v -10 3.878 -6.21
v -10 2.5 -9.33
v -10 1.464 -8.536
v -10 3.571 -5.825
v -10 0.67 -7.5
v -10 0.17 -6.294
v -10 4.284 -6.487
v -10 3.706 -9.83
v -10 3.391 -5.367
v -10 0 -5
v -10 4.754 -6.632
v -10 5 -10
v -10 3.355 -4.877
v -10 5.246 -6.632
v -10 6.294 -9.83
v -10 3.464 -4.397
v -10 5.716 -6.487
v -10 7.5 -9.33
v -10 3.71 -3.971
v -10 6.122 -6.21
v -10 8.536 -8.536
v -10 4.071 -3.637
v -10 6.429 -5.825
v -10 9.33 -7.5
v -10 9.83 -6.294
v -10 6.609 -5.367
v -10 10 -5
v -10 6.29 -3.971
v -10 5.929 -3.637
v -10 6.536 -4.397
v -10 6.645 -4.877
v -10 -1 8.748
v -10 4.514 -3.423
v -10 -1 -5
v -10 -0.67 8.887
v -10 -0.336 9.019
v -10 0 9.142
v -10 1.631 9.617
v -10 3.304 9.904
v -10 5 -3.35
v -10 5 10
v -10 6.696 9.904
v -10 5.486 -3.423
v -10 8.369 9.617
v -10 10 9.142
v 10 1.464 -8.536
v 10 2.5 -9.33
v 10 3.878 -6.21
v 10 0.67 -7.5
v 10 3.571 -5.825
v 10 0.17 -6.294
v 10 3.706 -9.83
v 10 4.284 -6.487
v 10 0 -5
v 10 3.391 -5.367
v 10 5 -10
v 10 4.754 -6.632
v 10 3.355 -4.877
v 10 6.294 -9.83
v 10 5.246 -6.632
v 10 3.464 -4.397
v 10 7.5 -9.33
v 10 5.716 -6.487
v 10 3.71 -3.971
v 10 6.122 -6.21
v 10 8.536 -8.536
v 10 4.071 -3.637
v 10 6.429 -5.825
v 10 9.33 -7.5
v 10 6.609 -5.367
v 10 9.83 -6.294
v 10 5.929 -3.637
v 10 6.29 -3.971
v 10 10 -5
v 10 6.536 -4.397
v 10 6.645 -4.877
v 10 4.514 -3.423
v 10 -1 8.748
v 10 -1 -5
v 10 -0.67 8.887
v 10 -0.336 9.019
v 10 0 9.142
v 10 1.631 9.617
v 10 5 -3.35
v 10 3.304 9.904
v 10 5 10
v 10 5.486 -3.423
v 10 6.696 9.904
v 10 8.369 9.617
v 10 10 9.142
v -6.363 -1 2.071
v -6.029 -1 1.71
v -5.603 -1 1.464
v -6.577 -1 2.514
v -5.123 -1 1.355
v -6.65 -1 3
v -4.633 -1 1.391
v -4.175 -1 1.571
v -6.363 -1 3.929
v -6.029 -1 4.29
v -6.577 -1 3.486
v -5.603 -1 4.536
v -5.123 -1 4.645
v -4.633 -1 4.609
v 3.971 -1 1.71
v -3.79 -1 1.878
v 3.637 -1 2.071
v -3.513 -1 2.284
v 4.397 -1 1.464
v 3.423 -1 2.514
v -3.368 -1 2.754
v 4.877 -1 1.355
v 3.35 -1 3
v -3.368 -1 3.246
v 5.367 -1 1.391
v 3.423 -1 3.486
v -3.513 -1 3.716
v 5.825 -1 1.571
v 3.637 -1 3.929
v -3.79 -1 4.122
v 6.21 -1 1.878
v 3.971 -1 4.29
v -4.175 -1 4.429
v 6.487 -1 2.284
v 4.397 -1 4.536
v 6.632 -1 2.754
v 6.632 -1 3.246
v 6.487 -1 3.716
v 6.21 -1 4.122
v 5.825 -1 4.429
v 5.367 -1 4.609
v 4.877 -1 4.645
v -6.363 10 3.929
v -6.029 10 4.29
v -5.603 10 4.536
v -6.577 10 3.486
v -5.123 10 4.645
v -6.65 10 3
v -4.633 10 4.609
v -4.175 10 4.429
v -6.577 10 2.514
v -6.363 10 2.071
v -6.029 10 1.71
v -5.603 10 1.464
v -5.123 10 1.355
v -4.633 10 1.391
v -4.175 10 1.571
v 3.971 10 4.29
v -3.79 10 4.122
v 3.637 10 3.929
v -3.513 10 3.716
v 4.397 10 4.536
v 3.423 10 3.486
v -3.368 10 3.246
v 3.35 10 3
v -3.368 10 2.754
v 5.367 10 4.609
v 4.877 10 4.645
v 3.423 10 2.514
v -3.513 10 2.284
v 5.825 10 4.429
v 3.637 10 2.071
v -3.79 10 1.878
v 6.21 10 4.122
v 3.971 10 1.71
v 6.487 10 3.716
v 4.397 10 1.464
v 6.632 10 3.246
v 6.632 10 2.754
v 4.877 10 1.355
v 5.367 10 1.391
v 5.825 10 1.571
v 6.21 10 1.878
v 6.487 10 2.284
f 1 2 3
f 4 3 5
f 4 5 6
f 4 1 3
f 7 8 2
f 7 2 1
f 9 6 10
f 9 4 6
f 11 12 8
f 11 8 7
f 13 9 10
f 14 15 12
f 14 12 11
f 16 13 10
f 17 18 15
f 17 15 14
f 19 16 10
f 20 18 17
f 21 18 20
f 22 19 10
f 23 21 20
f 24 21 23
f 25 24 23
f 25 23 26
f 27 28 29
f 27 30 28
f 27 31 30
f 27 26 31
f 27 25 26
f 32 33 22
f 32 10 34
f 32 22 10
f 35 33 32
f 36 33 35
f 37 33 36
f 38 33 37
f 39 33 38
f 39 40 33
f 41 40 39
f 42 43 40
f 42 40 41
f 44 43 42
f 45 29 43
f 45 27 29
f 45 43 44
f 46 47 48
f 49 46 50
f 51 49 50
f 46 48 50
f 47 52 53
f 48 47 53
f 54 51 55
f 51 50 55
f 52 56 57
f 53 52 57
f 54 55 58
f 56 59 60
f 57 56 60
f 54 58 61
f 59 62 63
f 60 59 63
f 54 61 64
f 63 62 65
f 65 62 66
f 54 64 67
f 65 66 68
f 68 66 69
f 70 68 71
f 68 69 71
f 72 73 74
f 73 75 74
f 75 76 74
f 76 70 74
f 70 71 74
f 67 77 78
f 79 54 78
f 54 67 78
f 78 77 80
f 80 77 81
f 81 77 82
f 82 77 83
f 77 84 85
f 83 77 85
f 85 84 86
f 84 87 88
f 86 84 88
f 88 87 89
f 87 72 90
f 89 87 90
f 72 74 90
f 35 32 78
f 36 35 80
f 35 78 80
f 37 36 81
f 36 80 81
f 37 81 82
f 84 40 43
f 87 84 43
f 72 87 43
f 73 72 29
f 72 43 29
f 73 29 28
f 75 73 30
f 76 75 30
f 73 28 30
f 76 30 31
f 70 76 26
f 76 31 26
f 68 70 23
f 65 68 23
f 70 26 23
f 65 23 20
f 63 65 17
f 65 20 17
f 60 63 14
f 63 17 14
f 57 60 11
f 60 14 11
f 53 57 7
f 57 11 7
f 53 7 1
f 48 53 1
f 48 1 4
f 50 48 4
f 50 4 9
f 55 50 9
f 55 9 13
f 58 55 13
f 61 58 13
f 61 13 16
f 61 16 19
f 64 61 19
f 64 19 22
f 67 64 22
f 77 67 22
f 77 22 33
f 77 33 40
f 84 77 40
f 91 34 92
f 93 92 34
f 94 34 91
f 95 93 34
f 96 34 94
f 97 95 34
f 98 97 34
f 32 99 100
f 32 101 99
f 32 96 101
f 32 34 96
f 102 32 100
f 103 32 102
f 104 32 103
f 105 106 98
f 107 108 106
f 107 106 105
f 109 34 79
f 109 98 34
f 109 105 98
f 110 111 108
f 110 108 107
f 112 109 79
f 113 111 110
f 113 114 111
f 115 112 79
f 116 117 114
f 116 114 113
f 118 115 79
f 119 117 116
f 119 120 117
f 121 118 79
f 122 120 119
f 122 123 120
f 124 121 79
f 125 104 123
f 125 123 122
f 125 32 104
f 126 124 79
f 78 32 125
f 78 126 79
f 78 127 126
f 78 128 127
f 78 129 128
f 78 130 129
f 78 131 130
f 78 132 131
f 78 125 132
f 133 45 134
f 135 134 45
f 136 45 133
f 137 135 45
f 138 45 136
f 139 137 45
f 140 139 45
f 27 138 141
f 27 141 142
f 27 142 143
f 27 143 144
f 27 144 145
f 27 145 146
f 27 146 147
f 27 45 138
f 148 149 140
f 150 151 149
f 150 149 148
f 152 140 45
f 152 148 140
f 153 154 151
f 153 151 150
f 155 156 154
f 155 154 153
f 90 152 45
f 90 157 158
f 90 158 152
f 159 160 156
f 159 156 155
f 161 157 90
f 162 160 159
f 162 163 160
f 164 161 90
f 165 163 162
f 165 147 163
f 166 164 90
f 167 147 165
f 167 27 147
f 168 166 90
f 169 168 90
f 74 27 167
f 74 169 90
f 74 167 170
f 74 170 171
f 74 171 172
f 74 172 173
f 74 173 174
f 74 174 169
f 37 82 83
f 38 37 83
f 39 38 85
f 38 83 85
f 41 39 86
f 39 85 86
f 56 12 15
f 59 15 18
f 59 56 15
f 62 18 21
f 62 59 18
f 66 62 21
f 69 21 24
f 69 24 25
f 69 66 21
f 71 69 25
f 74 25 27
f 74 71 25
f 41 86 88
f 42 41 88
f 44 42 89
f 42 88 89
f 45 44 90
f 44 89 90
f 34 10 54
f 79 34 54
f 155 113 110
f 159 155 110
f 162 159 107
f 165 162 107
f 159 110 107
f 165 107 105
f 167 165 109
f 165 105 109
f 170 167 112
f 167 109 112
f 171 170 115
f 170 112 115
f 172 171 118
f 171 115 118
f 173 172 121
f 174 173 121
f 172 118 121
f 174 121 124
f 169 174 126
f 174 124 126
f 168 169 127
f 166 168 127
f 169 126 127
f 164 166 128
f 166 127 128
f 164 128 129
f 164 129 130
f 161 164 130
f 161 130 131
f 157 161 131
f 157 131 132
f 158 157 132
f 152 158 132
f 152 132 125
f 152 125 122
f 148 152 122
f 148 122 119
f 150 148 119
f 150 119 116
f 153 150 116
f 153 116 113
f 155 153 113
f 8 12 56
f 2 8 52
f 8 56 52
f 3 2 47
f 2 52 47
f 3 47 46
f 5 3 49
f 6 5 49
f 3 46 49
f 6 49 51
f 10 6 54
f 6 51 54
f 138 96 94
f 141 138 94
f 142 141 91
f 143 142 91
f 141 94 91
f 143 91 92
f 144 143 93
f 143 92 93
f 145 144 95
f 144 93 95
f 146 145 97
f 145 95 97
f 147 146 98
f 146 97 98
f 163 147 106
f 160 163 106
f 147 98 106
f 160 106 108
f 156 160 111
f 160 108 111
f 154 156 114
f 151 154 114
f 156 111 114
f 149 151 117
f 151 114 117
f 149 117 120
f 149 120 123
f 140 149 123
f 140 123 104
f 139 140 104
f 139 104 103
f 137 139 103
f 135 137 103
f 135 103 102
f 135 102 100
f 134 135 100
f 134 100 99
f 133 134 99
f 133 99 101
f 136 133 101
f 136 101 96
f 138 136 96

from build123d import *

# Parameters (mm, degrees)
SKETCH1_W             = 20
SKETCH1_H             = 20
BOSS_EXTRUDE1_DEPTH   = 10
FILLET1_R             = 5
M4X0_7_TAPPED_HOLE1_D = 3.3
SKETCH14_W            = 20
SKETCH14_H            = 15
BOSS_EXTRUDE4_DEPTH   = 1
M4X0_7_TAPPED_HOLE2_D = 3.3
CUT_EXTRUDE1_DEPTH    = 25.494897428


with BuildPart() as part:
    # Sketch1 → Boss-Extrude1 (new body)
    with BuildSketch(Plane(origin=(0, 0, 0), x_dir=(1, 0, 0), z_dir=(0, 1, 0))):
        Rectangle(SKETCH1_W, SKETCH1_H)
    extrude(amount=BOSS_EXTRUDE1_DEPTH)

    # Fillet1
    fillet1_edges = [part.edges().sort_by_distance(p)[0] for p in [
        (0, 0, -10),
        (0, 10, -10),
    ]]
    fillet(fillet1_edges, radius=FILLET1_R - 0.0001)  # a hair under: the kernel refuses the full size

    # M4x0.7 Tapped Hole1 (through all)
    with Locations(Plane(origin=(10, 0, 0), x_dir=(0, 0, -1), z_dir=(1, 0, 0))):
        with Locations((5, 5)):
            Hole(M4X0_7_TAPPED_HOLE1_D / 2)

    # Sketch14 → Boss-Extrude4 (add)
    with BuildSketch(Plane.XZ):
        with Locations((0, 2.5)):
            Rectangle(SKETCH14_W, SKETCH14_H)
    extrude(amount=BOSS_EXTRUDE4_DEPTH)

    # M4x0.7 Tapped Hole2 (through all)
    with Locations(Plane(origin=(0, 10, 0), x_dir=(1, 0, 0), z_dir=(0, 1, 0))):
        with Locations((-5, -3), (5, -3)):
            Hole(M4X0_7_TAPPED_HOLE2_D / 2)

    # Sketch9 → Cut-Extrude1 (cut, through all)
    with BuildSketch(Plane(origin=(10, 0, 0), x_dir=(0, 0, -1), z_dir=(1, 0, 0))):
        with BuildLine():
            ThreePointArc((-10, 5), (-9.783978395, 7.536529681), (-9.142135624, 10))
            Line((-9.142135624, 10), (-10, 10))
            Line((-10, 10), (-10, 5))
        make_face()
        with BuildLine():
            Line((-10, 0), (-9.142135624, 0))
            ThreePointArc((-9.142135624, 0), (-9.783978395, 2.463470319), (-10, 5))
            Line((-10, 5), (-10, 0))
        make_face()
        with BuildLine():
            Line((-10, -1), (-8.747727085, -1))
            ThreePointArc((-8.747727085, -1), (-8.953892306, -0.503534276), (-9.142135624, 0))
            Line((-9.142135624, 0), (-10, 0))
            Line((-10, 0), (-10, -1))
        make_face()
    extrude(amount=-CUT_EXTRUDE1_DEPTH, mode=Mode.SUBTRACT)


solid = part.part
